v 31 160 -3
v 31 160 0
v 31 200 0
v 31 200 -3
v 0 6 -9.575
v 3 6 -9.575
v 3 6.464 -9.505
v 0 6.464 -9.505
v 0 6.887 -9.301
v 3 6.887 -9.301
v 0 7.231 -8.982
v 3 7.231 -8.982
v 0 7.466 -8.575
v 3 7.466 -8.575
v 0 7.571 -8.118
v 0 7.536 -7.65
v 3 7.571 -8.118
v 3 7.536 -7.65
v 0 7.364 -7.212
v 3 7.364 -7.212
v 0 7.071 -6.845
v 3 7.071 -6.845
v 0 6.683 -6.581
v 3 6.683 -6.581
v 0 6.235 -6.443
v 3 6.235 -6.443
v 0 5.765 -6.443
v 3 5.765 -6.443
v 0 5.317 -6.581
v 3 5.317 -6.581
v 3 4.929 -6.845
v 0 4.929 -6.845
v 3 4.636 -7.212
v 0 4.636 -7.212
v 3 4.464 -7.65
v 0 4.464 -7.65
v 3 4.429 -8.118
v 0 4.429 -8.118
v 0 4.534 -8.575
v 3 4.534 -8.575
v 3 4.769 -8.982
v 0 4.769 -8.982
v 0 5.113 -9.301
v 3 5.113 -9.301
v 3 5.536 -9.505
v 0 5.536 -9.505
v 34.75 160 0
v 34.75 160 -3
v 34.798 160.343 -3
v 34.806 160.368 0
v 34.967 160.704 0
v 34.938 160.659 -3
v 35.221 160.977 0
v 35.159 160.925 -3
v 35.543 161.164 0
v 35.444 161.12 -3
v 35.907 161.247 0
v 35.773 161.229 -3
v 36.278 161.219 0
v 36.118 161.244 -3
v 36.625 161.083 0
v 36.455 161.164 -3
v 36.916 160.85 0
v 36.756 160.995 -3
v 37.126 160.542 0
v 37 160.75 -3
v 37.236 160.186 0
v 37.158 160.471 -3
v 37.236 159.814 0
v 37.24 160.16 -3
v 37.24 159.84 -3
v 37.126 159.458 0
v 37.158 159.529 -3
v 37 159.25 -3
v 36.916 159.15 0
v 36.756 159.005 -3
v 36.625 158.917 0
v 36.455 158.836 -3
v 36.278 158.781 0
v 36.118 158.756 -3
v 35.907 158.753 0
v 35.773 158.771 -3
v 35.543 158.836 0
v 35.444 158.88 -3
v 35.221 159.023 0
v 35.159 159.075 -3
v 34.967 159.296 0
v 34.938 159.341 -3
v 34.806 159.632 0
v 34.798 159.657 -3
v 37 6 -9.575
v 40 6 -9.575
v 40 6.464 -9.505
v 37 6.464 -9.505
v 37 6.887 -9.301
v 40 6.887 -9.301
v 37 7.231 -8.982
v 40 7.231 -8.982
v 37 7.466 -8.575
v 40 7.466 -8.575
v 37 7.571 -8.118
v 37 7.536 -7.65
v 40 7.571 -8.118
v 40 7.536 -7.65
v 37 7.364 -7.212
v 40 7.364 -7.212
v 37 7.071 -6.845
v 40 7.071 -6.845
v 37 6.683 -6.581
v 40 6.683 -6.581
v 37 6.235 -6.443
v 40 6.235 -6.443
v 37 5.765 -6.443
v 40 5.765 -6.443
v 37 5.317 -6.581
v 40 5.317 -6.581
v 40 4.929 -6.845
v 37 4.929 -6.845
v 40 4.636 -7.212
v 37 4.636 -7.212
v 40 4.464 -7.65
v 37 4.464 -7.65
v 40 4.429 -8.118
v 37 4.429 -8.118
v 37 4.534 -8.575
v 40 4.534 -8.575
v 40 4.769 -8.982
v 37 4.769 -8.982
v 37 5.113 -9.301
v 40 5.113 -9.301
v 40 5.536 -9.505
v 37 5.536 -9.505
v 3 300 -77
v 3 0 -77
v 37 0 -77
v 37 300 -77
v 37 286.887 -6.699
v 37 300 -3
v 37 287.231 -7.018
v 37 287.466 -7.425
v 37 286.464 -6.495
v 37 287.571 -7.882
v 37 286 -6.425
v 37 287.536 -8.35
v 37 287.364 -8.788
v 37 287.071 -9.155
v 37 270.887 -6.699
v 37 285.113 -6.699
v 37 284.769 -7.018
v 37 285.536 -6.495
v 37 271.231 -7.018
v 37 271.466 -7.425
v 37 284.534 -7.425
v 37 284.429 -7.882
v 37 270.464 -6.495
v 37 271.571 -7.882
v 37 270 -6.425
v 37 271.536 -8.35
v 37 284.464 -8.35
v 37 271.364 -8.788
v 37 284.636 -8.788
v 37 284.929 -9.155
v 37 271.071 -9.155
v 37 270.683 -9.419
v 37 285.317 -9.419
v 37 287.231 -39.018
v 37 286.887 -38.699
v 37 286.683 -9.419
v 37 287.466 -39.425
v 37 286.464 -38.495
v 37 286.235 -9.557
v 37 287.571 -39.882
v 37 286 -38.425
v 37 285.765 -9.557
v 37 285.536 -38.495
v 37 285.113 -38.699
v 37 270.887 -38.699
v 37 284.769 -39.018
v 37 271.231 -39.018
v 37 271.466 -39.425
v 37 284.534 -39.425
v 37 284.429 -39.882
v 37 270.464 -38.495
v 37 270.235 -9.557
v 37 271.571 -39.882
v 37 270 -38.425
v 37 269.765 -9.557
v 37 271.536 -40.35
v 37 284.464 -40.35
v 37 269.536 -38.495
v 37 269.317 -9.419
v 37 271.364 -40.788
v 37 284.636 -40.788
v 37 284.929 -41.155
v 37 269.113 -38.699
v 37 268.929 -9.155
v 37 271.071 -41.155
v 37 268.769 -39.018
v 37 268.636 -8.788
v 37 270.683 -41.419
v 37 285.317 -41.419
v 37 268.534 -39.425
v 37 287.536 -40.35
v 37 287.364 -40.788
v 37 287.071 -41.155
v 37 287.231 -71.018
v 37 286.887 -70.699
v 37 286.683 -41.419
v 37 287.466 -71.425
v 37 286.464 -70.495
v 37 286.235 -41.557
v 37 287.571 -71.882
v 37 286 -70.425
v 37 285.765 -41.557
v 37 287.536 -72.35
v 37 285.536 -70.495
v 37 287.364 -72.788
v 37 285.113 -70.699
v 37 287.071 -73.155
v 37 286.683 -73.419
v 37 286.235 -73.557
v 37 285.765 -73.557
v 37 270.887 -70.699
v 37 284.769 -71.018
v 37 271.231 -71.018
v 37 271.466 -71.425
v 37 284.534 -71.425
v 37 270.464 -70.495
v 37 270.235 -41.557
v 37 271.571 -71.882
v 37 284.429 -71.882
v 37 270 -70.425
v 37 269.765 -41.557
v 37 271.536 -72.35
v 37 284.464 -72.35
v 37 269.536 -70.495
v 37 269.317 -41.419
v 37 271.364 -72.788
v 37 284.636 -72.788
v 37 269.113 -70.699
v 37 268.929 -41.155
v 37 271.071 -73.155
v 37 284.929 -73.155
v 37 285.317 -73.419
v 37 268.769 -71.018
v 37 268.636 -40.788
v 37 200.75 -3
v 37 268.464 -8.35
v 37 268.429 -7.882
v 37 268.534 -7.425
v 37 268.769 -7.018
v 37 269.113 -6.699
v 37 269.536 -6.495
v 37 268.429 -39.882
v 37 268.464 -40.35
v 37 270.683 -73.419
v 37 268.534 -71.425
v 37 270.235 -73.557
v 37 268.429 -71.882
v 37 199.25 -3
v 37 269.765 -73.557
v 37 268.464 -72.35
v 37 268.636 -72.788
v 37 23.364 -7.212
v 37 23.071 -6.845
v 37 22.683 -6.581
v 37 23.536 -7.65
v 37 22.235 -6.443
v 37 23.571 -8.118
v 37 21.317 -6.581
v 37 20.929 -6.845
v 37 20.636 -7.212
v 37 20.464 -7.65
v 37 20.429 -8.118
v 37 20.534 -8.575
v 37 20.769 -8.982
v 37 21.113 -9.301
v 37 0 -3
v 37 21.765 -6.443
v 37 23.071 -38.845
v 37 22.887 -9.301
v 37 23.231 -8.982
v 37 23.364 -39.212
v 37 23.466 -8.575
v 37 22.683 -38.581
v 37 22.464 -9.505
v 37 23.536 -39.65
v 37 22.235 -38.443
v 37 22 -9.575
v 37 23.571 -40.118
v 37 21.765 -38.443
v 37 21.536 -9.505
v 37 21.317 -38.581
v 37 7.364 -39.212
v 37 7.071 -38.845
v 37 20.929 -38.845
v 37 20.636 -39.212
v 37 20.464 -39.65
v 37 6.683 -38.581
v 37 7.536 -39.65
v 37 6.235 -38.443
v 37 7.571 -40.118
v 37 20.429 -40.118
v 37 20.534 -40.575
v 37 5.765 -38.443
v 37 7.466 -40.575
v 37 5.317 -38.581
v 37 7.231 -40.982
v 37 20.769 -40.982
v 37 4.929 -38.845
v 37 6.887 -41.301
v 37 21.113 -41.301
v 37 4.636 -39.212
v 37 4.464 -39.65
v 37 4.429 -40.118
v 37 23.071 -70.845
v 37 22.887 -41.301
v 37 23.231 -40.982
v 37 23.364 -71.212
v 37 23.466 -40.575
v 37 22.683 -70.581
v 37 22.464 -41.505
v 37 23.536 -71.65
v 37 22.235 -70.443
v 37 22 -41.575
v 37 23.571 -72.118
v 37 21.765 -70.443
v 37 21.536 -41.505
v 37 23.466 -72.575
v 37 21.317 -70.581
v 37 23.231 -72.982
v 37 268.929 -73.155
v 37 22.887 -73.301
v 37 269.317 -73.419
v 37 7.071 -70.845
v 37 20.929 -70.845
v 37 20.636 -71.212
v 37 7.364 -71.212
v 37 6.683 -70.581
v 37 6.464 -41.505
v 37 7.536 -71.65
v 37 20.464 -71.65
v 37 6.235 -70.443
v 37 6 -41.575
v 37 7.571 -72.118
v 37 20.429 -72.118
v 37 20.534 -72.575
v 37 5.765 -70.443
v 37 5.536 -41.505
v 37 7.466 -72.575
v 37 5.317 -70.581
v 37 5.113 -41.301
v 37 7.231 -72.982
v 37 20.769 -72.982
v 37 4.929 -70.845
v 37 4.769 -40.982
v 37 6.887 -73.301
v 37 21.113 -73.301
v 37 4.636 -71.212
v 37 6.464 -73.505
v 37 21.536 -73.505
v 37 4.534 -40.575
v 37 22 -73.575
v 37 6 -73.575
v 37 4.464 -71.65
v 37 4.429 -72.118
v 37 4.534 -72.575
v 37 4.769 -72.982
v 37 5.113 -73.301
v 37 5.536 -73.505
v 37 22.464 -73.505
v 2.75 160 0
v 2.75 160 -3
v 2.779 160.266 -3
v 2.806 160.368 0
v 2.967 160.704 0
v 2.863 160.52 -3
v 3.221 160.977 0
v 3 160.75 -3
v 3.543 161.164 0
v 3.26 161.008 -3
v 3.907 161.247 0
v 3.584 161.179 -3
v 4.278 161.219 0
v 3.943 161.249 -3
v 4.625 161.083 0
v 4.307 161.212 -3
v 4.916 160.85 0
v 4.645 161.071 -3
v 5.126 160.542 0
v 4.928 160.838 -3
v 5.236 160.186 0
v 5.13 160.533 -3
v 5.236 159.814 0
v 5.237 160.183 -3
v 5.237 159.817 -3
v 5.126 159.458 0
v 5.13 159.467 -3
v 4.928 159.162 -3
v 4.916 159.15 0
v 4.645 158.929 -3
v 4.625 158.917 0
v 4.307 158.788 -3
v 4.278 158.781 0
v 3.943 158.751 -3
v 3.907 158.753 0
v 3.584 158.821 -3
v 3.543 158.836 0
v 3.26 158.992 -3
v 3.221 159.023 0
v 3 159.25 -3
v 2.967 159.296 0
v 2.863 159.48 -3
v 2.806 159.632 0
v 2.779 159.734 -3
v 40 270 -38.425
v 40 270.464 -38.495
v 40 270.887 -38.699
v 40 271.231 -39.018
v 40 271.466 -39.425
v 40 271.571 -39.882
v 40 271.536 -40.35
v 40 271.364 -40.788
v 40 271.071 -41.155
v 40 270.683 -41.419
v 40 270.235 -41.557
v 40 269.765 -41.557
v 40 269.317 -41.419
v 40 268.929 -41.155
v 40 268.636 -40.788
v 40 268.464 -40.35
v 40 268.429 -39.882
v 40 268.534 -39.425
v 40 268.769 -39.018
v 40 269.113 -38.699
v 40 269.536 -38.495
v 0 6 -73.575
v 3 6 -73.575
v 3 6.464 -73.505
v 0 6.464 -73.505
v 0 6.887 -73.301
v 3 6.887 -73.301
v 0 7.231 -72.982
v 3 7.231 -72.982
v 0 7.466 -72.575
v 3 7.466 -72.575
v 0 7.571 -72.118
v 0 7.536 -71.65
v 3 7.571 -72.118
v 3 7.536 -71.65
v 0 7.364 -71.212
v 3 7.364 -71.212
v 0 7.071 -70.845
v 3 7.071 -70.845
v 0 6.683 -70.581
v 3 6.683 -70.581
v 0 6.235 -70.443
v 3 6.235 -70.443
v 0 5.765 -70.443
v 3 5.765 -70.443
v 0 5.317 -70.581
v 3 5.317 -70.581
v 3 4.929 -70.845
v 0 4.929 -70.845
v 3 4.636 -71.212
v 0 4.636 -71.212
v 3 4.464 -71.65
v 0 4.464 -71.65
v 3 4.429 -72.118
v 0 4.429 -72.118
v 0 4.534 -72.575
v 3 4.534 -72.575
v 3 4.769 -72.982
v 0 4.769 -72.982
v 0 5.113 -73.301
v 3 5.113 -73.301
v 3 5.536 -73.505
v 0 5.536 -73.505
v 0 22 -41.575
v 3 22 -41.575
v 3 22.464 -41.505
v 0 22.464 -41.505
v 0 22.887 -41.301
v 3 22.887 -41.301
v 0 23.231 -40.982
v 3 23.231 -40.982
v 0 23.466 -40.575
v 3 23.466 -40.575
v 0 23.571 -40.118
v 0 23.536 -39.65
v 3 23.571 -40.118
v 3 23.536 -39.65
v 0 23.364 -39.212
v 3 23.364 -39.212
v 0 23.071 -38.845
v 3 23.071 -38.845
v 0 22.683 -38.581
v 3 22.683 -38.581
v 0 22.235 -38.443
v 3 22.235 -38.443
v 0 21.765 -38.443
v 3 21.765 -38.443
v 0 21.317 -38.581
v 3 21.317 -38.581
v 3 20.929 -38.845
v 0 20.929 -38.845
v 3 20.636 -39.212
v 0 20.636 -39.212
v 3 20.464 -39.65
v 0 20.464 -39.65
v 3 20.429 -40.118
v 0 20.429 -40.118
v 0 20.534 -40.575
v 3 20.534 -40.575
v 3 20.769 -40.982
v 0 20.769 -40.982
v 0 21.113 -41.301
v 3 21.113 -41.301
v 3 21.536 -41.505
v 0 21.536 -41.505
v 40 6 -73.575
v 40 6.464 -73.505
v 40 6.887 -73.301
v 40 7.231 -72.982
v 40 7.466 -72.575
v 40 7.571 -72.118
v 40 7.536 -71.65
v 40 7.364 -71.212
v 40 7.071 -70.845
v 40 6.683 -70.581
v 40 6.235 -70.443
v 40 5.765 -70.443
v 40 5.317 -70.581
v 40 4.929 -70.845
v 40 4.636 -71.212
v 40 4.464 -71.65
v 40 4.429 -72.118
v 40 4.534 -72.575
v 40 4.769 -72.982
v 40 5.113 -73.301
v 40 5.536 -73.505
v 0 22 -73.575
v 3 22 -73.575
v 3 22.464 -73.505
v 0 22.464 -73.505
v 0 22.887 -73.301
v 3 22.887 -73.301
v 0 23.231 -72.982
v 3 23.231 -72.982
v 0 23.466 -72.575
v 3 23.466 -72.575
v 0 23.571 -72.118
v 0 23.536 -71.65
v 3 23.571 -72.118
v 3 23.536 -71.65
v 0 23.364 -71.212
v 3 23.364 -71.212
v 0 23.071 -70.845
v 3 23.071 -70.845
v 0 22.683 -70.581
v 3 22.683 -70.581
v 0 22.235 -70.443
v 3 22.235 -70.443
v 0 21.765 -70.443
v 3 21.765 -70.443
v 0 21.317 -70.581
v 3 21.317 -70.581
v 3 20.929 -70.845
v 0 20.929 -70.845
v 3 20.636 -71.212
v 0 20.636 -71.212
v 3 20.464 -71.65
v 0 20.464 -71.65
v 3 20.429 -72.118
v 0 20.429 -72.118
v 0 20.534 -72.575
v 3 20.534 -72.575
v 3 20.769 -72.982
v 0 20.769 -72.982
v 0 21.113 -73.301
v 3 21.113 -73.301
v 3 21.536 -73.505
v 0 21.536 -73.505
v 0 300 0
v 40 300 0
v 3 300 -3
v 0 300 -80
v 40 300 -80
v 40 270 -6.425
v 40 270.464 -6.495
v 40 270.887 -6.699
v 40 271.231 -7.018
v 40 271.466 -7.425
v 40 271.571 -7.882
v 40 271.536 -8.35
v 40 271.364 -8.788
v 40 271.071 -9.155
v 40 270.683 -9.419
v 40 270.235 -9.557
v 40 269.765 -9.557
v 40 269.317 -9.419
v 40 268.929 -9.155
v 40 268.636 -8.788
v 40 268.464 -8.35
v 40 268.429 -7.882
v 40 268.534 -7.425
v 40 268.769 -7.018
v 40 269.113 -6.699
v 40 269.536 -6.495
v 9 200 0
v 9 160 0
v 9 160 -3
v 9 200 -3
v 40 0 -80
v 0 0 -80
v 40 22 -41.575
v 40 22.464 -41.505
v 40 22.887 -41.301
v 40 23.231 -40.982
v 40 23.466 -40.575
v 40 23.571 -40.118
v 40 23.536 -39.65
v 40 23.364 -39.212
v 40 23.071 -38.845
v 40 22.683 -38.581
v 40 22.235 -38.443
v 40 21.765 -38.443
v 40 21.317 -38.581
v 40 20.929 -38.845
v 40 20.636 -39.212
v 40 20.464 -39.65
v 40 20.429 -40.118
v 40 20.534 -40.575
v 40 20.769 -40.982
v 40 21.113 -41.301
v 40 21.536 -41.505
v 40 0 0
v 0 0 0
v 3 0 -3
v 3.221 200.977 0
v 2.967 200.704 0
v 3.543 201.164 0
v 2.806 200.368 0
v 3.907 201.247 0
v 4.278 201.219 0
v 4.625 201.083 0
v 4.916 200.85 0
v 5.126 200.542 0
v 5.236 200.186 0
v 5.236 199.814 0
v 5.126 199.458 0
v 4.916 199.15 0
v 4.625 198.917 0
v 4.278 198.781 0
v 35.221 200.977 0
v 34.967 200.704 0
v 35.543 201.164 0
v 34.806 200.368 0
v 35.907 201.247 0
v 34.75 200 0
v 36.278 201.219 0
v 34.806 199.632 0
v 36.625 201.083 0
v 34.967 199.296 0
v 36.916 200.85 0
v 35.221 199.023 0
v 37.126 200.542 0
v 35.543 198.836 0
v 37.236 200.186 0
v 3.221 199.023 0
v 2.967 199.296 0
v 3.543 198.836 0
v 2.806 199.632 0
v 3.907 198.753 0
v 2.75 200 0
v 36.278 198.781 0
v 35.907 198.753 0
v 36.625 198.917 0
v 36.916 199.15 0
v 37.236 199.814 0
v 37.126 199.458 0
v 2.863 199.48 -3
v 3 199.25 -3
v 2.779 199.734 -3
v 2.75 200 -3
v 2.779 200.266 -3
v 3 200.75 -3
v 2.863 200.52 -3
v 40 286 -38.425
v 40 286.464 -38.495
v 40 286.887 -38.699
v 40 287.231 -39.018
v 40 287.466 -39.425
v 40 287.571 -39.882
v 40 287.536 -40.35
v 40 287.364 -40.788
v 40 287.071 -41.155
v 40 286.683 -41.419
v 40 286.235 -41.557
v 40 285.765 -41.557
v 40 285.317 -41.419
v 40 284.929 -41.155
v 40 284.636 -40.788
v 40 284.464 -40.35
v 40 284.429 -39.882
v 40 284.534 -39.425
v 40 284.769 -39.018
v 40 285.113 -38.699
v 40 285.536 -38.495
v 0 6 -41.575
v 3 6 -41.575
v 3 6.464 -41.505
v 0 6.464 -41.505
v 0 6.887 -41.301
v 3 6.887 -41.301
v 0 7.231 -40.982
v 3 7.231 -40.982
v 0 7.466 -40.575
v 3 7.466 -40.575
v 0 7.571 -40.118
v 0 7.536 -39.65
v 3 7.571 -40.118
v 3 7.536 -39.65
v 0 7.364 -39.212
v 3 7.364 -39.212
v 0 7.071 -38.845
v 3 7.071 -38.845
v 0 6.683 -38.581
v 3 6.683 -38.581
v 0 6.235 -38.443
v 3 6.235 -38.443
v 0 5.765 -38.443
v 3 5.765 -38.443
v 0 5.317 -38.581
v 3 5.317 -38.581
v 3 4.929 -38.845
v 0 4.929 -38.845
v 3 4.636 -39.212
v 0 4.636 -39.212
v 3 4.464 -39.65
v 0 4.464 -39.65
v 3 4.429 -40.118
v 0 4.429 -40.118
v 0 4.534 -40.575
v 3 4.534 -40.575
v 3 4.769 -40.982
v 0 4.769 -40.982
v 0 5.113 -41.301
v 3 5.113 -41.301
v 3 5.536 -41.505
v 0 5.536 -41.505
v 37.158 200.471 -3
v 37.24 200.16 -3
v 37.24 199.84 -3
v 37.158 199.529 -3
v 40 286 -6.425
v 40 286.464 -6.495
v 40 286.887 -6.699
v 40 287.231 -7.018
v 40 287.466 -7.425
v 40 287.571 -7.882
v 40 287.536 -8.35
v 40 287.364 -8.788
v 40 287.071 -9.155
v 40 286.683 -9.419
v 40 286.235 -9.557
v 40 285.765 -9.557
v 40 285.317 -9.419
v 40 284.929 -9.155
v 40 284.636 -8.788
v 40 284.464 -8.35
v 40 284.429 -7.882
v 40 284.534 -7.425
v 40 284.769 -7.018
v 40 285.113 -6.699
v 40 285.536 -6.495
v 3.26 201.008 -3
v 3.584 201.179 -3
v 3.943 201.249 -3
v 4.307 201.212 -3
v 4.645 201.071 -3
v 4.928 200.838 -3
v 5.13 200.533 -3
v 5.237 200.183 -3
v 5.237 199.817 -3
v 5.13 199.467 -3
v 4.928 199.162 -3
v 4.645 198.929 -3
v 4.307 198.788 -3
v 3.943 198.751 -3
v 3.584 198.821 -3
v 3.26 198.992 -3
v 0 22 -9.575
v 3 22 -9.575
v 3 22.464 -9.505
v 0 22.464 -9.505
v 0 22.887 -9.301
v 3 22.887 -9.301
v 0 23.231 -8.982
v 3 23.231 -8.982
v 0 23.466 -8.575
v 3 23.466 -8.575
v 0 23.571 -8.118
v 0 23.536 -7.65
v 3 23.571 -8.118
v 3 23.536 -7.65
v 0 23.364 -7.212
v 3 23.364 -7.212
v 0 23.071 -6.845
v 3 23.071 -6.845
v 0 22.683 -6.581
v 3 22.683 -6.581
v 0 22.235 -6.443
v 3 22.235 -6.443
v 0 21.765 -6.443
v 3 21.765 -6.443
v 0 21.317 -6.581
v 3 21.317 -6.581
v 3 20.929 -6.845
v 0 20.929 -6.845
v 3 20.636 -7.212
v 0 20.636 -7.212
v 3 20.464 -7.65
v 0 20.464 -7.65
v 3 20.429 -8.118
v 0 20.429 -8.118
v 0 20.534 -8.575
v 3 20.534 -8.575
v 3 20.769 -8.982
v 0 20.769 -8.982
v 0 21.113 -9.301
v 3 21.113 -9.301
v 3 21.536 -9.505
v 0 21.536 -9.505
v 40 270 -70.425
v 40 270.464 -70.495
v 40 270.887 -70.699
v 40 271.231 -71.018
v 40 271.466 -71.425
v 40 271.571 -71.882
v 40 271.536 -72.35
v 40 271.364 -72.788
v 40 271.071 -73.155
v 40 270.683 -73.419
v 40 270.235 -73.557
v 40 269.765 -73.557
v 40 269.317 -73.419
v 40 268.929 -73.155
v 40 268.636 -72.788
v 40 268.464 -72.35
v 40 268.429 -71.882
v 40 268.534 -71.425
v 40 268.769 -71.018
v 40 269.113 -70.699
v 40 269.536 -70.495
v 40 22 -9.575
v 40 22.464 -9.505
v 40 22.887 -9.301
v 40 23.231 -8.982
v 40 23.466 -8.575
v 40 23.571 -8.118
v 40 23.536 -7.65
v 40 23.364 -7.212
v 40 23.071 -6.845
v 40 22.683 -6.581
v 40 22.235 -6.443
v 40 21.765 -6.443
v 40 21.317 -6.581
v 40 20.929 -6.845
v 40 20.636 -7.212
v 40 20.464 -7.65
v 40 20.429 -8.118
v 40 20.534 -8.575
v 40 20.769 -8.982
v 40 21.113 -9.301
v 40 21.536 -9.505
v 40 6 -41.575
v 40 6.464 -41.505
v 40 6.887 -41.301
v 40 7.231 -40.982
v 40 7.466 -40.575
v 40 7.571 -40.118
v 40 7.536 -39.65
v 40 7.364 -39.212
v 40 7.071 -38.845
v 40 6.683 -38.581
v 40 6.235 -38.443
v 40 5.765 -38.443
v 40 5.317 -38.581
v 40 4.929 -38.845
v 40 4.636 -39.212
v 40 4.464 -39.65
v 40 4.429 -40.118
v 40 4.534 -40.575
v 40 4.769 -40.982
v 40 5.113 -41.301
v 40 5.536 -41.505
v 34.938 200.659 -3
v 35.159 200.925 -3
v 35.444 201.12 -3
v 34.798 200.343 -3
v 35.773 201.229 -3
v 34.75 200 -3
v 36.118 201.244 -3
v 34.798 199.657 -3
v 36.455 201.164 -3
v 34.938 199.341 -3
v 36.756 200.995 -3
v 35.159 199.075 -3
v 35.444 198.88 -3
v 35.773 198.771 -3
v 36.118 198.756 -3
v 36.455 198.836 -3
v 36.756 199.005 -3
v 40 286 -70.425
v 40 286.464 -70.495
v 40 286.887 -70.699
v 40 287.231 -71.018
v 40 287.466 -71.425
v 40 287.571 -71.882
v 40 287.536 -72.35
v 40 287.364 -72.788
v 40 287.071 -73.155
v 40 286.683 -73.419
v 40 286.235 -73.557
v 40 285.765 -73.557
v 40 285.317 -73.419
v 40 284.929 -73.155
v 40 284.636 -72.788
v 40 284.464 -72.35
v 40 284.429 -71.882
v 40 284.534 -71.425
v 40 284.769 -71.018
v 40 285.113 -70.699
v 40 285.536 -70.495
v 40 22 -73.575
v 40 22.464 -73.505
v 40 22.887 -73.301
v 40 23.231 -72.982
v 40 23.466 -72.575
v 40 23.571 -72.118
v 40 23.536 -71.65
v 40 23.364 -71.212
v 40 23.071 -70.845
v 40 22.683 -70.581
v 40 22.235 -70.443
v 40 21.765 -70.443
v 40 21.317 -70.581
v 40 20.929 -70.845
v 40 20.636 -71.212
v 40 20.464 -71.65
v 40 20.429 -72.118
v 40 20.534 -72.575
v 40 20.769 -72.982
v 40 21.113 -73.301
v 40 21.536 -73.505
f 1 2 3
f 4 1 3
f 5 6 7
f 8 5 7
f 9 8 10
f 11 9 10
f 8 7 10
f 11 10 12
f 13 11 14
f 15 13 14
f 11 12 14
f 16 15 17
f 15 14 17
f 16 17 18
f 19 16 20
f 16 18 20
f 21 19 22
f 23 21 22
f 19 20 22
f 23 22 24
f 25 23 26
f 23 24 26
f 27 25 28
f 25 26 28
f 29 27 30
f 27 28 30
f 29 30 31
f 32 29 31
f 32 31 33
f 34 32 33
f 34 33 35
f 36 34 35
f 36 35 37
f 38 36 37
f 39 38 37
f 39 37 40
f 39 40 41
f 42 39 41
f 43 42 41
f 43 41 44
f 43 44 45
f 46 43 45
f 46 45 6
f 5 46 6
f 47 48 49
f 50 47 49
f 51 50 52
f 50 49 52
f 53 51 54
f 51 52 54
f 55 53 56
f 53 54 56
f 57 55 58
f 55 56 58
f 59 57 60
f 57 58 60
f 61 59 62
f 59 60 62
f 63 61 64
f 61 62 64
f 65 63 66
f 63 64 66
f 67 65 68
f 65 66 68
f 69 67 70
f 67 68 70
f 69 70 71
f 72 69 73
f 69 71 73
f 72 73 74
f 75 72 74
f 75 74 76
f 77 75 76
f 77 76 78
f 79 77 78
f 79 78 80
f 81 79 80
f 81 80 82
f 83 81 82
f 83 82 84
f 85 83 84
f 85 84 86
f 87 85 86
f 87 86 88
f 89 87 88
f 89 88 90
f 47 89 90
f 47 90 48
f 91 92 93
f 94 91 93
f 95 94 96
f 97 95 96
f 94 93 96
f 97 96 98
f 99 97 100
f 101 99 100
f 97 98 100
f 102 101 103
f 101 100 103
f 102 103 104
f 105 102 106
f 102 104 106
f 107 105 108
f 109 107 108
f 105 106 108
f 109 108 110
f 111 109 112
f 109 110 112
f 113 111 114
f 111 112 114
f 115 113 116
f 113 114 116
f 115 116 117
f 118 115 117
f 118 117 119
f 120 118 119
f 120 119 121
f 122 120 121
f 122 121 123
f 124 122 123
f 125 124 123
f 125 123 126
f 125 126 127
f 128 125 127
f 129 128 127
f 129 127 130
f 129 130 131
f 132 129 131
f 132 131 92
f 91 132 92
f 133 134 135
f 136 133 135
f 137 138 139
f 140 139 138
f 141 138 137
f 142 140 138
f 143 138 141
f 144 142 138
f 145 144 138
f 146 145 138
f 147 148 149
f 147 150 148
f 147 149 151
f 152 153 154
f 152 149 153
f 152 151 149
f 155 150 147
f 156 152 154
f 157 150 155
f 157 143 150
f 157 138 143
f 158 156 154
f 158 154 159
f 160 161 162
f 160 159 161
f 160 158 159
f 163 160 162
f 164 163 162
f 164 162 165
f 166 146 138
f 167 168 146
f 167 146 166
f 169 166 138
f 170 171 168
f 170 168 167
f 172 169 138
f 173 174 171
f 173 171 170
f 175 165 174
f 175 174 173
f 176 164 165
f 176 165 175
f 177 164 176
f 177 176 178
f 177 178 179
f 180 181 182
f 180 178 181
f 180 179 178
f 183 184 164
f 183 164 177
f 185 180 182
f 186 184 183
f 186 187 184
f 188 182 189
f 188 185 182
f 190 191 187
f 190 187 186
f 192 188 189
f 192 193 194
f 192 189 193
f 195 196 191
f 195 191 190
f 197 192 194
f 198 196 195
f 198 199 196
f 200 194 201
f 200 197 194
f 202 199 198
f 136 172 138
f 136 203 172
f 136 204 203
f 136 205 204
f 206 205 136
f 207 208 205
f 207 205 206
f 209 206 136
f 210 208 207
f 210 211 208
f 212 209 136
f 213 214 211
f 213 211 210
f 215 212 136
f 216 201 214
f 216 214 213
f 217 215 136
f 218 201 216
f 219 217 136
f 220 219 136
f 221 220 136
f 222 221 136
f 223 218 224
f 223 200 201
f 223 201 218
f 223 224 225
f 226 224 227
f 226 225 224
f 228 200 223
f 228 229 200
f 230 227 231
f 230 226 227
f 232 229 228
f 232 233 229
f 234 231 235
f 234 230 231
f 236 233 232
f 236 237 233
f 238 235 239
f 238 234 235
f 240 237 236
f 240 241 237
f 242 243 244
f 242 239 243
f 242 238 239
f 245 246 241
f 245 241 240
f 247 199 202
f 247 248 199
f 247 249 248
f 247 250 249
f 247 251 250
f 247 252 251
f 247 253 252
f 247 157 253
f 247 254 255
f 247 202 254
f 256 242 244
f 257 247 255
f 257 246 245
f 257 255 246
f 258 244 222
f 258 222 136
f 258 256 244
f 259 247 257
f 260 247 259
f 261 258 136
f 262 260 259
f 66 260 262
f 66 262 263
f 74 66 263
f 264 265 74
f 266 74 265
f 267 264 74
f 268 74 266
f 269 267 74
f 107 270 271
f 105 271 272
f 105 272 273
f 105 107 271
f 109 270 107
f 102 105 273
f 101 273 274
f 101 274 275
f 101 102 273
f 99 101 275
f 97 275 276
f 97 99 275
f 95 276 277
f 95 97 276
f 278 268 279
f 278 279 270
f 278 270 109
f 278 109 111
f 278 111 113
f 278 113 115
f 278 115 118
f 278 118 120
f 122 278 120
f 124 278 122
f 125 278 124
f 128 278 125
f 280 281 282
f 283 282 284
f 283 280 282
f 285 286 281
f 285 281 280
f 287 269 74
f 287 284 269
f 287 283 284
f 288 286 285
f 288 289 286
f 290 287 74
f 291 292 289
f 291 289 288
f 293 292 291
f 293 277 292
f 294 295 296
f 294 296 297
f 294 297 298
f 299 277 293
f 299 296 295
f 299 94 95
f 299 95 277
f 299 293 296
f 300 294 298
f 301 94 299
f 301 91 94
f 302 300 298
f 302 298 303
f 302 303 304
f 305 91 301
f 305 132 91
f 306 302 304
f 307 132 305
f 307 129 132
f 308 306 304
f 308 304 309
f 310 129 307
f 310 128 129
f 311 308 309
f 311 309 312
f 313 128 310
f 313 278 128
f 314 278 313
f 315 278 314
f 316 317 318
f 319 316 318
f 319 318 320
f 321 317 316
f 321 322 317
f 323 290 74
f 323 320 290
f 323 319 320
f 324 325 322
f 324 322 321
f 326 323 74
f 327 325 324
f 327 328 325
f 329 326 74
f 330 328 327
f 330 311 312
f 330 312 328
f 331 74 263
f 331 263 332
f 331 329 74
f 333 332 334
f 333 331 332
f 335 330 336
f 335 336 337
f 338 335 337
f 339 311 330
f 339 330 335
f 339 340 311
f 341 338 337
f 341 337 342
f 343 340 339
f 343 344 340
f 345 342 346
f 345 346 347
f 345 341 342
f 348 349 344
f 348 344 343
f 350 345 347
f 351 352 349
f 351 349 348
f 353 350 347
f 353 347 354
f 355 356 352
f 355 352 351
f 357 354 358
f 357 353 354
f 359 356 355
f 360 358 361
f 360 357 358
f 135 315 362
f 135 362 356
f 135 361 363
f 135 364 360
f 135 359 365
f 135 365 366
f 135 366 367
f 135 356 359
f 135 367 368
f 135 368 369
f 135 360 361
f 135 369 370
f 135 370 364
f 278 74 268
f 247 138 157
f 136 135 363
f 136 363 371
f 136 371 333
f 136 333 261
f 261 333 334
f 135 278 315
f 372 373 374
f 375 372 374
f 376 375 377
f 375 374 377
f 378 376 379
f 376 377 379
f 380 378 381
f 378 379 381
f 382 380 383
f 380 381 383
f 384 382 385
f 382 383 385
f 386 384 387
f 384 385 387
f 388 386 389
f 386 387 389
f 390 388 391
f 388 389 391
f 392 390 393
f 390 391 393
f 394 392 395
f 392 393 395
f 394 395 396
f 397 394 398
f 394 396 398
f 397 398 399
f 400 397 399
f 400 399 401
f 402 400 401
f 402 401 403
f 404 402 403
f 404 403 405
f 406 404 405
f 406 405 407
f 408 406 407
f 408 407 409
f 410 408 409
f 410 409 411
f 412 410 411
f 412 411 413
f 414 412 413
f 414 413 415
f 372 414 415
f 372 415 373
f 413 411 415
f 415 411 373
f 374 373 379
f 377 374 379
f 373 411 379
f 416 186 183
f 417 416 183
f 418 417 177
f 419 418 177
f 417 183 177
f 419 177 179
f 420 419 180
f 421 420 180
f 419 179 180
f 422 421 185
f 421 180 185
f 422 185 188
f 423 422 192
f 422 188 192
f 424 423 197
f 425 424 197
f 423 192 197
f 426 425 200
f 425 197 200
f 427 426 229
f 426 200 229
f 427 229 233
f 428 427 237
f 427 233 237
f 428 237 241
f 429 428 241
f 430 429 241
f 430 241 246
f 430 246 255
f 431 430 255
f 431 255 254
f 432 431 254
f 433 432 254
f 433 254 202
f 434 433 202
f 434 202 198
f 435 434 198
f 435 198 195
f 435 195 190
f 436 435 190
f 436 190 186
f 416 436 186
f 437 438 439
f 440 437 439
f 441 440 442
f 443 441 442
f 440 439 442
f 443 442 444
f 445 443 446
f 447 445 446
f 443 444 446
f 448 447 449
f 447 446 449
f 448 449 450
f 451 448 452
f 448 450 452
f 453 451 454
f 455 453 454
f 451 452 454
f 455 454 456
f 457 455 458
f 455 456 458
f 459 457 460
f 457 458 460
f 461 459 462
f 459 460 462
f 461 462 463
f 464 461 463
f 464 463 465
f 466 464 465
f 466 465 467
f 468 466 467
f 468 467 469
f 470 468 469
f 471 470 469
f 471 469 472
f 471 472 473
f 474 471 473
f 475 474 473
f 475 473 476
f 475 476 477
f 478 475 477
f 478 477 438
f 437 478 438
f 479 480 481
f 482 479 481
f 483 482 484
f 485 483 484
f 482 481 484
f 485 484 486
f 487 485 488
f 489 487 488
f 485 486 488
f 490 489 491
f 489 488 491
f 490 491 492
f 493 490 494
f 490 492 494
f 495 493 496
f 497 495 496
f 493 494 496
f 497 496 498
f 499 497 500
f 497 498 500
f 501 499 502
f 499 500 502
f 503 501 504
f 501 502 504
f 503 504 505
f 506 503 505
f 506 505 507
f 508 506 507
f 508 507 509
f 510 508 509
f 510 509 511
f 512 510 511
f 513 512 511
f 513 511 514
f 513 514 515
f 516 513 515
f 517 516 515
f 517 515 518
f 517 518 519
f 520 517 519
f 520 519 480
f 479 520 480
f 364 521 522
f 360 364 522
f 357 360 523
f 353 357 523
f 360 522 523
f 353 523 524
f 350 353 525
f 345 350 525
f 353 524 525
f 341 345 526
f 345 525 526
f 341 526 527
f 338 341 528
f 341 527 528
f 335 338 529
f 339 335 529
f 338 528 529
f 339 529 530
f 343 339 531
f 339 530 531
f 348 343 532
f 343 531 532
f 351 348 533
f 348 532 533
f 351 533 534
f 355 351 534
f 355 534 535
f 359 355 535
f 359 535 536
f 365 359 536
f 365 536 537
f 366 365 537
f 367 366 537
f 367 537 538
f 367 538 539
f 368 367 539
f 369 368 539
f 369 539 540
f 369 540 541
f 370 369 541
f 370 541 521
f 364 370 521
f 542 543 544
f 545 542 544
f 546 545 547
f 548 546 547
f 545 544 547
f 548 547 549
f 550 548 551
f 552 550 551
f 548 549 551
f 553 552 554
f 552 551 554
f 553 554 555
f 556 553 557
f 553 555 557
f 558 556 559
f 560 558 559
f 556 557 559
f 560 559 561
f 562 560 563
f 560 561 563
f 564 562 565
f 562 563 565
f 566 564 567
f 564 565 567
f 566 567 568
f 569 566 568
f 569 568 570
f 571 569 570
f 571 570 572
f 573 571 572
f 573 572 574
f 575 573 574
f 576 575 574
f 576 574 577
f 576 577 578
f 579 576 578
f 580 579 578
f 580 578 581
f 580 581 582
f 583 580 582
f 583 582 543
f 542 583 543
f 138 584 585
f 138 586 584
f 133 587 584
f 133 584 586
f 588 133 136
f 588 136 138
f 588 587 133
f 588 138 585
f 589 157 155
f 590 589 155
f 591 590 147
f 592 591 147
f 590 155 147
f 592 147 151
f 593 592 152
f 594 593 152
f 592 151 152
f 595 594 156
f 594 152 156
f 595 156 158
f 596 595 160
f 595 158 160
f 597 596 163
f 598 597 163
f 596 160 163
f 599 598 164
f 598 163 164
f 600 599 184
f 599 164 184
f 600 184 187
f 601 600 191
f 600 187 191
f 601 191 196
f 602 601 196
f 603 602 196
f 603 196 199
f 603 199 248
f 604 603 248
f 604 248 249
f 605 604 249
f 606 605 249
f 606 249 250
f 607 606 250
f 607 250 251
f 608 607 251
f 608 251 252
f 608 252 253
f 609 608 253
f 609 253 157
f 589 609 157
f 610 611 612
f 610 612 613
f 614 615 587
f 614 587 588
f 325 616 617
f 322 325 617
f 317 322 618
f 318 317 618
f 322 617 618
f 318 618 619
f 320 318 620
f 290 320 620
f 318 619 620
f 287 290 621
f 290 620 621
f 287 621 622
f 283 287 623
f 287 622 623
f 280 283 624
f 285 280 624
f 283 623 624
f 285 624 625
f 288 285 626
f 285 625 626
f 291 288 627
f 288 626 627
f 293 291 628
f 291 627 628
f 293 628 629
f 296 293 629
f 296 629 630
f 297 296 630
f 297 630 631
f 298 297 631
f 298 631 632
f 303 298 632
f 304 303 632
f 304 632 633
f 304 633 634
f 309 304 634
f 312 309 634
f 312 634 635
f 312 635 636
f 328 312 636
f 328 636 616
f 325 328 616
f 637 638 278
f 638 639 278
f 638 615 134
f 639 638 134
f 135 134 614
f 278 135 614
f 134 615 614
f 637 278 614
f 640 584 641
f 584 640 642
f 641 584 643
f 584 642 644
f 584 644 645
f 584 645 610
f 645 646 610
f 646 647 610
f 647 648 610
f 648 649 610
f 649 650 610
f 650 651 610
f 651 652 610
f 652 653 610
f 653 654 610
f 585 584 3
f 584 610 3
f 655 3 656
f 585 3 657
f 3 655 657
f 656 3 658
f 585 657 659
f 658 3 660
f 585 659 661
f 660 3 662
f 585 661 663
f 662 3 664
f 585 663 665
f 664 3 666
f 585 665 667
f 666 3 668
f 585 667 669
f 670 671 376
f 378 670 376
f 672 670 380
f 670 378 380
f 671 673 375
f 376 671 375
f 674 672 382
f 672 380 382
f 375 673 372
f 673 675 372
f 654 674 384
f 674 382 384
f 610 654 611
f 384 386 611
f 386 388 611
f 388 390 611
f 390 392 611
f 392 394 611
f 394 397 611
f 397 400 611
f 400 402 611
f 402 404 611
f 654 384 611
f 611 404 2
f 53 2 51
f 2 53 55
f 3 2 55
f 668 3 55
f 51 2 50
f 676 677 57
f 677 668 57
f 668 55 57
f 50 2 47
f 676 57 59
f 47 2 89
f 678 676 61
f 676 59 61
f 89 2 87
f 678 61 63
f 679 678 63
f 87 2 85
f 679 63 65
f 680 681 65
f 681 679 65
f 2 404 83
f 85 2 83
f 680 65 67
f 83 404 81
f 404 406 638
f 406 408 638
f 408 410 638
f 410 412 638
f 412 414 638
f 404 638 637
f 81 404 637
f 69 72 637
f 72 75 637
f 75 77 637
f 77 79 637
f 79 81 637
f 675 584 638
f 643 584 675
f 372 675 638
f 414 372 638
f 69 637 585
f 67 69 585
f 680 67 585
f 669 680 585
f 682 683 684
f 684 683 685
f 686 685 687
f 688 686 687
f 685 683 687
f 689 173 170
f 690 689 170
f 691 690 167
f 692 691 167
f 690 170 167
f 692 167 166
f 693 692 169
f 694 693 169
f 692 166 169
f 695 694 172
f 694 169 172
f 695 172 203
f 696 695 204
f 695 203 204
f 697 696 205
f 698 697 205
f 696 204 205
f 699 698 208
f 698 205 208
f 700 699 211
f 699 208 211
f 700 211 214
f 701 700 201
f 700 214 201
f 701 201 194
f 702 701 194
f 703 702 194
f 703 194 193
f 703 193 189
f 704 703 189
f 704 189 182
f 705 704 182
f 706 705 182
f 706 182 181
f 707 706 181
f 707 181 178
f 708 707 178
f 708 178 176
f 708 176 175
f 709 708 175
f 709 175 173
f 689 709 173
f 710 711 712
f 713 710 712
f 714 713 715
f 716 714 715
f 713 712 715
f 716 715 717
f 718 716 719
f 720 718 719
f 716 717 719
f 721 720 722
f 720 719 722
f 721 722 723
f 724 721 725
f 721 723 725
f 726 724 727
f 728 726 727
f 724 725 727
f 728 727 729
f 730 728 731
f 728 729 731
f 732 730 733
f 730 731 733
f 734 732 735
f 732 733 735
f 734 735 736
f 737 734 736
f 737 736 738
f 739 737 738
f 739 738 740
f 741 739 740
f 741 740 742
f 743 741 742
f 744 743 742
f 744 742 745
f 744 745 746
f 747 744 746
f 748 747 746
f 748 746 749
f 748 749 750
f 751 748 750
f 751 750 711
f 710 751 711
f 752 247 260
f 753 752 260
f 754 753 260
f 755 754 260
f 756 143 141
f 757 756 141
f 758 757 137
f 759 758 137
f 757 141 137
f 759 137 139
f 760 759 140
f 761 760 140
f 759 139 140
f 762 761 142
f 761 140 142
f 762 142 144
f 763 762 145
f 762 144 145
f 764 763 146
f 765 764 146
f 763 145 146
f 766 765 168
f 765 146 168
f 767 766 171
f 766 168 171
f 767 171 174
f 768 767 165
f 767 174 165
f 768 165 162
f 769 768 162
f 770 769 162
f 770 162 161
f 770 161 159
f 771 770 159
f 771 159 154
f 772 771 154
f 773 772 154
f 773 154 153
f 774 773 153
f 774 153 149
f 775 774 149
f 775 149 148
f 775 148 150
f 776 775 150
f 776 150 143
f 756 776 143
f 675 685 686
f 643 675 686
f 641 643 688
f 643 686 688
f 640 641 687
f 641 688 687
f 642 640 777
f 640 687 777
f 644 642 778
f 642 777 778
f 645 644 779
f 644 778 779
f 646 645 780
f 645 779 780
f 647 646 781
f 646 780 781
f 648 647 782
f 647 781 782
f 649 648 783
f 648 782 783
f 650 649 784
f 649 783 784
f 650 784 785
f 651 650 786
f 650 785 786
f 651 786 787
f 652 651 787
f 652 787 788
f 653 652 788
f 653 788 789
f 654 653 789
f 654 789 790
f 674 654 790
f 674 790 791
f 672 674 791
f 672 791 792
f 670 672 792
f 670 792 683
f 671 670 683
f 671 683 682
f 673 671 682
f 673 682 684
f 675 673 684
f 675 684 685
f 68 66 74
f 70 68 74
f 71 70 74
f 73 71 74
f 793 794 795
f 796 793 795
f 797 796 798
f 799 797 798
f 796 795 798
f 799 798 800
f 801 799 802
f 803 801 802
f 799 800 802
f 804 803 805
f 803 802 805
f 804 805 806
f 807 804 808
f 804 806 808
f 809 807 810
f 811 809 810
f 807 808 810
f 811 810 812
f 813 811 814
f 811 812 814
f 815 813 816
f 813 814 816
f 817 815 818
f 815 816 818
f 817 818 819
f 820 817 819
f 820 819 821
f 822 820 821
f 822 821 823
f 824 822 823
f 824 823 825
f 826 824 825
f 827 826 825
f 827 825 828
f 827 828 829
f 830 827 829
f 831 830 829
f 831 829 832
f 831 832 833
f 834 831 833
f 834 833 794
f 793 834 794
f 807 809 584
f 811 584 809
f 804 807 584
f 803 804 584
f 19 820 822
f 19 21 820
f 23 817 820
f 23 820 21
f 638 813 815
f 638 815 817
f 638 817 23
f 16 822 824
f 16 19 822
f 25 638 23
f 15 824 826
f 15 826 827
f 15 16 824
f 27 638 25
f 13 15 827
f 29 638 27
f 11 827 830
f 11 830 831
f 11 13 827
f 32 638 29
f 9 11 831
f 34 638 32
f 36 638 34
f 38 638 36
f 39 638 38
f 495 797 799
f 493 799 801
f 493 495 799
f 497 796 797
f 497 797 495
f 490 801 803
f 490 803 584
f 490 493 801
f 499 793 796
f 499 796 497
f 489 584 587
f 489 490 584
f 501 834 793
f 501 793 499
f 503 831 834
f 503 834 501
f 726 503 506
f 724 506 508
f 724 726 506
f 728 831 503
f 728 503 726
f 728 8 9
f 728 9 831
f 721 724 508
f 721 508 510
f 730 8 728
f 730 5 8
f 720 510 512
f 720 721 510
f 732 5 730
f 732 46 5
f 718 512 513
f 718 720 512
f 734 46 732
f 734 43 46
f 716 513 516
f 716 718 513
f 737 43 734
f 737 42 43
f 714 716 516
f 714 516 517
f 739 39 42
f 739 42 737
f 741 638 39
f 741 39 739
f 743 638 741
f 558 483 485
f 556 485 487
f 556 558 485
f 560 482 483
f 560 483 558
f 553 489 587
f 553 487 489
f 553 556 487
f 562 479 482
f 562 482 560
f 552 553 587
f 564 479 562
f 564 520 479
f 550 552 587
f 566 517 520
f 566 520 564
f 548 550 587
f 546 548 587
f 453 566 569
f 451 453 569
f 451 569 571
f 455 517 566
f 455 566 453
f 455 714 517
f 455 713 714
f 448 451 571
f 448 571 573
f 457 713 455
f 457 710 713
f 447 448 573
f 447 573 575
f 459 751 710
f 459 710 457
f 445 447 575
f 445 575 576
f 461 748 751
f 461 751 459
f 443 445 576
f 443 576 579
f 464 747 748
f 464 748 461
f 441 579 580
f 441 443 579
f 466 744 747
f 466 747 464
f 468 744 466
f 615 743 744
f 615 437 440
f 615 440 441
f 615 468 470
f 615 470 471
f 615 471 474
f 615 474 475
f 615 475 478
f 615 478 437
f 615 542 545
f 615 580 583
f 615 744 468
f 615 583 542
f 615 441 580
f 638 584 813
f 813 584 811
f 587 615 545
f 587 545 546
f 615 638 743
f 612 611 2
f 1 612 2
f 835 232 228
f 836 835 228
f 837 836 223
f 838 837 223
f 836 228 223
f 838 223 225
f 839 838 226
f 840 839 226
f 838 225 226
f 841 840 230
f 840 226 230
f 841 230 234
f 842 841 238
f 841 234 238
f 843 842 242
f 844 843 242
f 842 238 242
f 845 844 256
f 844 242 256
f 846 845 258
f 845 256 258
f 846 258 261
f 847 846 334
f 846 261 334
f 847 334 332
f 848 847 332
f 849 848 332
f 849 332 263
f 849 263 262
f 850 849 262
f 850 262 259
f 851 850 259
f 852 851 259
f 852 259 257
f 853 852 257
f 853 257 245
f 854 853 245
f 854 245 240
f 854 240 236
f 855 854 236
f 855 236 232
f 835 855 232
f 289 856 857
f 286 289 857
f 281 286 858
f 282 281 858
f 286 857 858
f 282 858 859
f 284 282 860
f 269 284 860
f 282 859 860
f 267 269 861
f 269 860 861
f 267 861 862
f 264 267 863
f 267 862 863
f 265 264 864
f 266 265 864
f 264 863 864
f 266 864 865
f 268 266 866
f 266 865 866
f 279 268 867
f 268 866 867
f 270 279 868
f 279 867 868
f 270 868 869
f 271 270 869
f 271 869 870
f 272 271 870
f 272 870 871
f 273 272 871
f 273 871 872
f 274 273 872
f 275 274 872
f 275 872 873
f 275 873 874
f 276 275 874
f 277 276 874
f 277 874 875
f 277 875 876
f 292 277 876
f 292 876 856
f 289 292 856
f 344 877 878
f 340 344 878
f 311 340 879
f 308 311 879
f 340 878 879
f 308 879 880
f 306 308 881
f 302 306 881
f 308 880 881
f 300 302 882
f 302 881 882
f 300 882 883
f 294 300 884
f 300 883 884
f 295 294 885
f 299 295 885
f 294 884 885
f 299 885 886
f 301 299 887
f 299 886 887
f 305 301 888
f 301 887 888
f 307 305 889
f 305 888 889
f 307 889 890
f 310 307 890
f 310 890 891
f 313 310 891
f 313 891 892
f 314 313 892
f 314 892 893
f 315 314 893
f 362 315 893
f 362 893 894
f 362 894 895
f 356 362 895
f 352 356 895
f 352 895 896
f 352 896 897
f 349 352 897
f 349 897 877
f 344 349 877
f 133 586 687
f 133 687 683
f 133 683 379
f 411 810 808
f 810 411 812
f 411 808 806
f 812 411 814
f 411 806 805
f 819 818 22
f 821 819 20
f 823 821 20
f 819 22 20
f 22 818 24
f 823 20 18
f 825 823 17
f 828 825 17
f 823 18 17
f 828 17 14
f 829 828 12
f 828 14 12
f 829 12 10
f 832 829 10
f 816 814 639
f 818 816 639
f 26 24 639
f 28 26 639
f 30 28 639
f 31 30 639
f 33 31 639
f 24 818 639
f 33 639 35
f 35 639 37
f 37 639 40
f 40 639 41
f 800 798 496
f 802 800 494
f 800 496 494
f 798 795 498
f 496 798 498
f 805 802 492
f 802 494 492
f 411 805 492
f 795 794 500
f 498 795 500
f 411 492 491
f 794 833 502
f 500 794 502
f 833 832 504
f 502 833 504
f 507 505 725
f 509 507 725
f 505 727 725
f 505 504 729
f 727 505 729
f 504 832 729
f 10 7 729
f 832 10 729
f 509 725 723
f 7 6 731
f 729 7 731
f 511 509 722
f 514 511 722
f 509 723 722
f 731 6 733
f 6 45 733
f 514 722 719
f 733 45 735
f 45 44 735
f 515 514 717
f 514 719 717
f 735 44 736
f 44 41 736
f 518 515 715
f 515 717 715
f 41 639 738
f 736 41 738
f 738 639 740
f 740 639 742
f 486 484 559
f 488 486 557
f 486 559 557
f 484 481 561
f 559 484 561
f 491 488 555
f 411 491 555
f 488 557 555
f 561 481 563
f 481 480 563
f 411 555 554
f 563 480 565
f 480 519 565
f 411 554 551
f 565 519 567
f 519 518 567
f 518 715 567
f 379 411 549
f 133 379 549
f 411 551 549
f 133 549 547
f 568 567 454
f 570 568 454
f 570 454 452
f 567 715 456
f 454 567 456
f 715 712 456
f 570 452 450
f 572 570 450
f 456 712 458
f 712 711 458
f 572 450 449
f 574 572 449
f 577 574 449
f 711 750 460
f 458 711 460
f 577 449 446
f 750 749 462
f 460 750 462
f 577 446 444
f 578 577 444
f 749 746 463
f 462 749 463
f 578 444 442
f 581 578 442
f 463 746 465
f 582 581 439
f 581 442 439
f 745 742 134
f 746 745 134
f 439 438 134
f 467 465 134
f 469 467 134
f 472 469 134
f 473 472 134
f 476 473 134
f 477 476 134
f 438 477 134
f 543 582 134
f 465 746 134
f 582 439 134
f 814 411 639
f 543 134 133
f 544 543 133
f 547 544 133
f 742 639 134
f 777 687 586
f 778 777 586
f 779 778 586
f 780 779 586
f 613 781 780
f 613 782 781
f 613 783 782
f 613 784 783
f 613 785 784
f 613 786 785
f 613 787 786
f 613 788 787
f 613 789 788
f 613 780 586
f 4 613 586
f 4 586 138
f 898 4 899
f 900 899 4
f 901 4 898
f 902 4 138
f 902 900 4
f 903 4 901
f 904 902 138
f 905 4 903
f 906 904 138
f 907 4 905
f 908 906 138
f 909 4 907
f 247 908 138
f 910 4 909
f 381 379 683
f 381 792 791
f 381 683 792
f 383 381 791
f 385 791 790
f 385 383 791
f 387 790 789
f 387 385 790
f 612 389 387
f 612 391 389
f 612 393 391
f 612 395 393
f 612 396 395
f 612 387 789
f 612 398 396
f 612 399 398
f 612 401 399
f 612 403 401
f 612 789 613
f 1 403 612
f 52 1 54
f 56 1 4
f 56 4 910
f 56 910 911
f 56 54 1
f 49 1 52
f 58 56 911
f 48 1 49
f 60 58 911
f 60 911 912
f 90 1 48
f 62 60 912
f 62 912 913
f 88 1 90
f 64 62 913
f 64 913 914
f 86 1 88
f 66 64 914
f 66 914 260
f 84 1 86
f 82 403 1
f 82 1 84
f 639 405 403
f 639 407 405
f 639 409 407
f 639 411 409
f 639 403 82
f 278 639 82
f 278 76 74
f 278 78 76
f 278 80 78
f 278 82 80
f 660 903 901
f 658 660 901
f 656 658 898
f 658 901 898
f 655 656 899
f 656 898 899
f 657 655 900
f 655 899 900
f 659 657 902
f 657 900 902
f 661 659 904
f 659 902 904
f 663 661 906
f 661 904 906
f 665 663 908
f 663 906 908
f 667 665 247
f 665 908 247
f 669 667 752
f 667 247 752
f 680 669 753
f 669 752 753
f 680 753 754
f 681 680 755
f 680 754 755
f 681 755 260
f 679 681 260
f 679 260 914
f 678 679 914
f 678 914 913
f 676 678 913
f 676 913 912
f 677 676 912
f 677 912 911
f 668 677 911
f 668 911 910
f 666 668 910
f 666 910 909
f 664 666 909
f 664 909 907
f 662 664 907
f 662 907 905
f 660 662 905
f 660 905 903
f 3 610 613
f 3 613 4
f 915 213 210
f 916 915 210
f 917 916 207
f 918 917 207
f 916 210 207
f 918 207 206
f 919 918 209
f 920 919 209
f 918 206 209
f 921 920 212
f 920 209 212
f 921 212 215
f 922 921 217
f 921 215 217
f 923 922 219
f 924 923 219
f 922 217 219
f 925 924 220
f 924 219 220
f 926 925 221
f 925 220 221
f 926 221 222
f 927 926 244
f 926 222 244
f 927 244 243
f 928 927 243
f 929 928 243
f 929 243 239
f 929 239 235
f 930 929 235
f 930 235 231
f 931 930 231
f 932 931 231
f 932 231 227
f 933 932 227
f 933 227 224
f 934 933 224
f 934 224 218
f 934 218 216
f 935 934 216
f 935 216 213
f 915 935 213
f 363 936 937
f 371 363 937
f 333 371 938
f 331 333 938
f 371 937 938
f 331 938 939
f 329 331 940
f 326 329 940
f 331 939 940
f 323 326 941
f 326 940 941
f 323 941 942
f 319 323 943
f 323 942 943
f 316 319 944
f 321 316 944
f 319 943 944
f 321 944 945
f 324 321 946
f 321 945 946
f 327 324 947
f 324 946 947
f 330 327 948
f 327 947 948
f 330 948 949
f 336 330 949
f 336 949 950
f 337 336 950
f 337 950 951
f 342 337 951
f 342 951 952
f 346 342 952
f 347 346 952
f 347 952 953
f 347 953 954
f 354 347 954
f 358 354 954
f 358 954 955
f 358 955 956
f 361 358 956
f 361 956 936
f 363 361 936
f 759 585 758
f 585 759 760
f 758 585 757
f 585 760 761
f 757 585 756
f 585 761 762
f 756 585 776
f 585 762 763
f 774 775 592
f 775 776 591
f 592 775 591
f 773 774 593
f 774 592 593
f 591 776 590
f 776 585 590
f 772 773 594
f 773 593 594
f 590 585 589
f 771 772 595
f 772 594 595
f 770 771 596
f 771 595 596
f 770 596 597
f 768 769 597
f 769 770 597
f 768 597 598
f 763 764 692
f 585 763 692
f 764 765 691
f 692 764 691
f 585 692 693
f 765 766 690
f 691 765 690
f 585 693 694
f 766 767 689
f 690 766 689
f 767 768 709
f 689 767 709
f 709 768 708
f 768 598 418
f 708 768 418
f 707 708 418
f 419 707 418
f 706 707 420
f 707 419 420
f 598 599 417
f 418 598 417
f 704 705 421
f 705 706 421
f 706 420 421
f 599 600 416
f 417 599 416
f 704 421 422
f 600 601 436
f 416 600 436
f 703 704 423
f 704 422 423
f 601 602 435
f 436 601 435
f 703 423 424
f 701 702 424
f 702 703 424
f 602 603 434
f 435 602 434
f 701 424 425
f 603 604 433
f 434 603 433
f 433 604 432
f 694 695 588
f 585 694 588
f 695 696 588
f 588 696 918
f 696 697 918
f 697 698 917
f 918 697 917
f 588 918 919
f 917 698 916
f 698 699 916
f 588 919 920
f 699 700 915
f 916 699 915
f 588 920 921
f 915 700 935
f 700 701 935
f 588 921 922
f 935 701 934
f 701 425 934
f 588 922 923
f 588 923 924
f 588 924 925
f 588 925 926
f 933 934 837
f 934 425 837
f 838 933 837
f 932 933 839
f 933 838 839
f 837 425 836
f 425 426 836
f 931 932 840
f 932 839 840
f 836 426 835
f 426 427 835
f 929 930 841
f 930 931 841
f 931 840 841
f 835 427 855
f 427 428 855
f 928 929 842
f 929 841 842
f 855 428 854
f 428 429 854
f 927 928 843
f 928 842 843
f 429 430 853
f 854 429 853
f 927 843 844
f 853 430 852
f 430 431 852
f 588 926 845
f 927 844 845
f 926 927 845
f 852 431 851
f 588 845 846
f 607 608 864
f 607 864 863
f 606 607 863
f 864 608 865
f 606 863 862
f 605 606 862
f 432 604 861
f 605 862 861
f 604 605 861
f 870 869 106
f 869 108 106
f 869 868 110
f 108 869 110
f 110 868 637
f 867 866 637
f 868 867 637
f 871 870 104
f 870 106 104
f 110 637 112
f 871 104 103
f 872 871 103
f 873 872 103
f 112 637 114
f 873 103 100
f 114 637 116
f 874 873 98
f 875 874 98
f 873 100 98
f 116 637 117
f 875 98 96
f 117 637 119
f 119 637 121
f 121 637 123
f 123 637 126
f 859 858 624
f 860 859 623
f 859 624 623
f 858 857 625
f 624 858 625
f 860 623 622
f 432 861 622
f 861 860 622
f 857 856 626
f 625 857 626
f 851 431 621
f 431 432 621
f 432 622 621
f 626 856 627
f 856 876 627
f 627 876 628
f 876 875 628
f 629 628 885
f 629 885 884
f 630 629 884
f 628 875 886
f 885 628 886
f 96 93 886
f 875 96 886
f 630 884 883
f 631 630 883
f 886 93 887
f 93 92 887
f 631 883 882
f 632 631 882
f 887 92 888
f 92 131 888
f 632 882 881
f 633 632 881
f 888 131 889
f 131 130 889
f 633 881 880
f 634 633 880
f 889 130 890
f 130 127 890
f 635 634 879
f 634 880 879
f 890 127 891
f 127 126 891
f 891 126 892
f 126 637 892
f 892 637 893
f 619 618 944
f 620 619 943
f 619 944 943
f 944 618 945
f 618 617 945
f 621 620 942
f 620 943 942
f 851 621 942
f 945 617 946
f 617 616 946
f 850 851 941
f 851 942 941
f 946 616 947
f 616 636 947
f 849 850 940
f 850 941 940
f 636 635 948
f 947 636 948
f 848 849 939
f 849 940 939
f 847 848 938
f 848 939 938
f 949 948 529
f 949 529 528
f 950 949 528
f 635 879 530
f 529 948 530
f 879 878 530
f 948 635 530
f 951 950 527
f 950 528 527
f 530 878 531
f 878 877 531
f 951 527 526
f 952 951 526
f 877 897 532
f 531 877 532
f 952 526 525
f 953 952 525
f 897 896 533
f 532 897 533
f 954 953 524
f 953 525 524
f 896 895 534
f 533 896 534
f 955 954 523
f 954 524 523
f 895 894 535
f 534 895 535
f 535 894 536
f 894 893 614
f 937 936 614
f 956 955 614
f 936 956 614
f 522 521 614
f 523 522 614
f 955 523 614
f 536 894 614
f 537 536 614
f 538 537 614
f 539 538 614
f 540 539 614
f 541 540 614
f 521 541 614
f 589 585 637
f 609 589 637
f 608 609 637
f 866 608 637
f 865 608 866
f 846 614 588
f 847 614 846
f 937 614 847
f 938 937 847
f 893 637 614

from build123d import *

# Parameters (mm, degrees)
SKETCH1_W                        = 40
SKETCH1_H                        = 80
SKETCH1_W_2                      = 34
SKETCH1_H_2                      = 74
BOSS_EXTRUDE1_DEPTH              = 300
CUT_EXTRUDE1_REACH               = 315.05
SKETCH2_W                        = 22
SKETCH2_H                        = 40
TAP_DRILL_FOR_M3_TAP1_D          = 2.5
TAP_DRILL_FOR_M3_TAP1_DEPTH      = 3
TAP_DRILL_FOR_M3_HELICOIL1_D     = 3.15
TAP_DRILL_FOR_M3_HELICOIL2_D     = 3.15
TAP_DRILL_FOR_M3_HELICOIL2_DEPTH = 3


with BuildPart() as part:
    # Sketch1 → Boss-Extrude1 (new body)
    with BuildSketch(Plane(origin=(0, 0, 0), x_dir=(1, 0, 0), z_dir=(0, 1, 0))):
        with Locations((20, 40)):
            Rectangle(SKETCH1_W, SKETCH1_H)
        with Locations((20, 40)):
            Rectangle(SKETCH1_W_2, SKETCH1_H_2, mode=Mode.SUBTRACT)
    extrude(amount=BOSS_EXTRUDE1_DEPTH)

    # Sketch2 → Cut-Extrude1 (cut, up to next)
    with BuildSketch(Plane.XY, mode=Mode.PRIVATE) as cut_extrude1_sk1:
        with Locations((20, 180)):
            Rectangle(SKETCH2_W, SKETCH2_H)
    cut_extrude1_tool1 = extrude(cut_extrude1_sk1.sketch, amount=-CUT_EXTRUDE1_REACH, mode=Mode.PRIVATE) & part.part
    add(cut_extrude1_tool1.solids().sort_by_distance((20, 180, 0))[0], mode=Mode.SUBTRACT)

    # Tap Drill for M3 Tap1
    with Locations(Plane.XY):
        with Locations((4, 200), (36, 200), (36, 160), (4, 160)):
            Hole(TAP_DRILL_FOR_M3_TAP1_D / 2, depth=TAP_DRILL_FOR_M3_TAP1_DEPTH)

    # Tap Drill for M3 Helicoil1 (through all)
    with Locations(Plane.ZY):
        with Locations((-8, 6), (-40, 6), (-72, 6), (-40, 22), (-72, 22), (-8, 22)):
            Hole(TAP_DRILL_FOR_M3_HELICOIL1_D / 2)

    # Tap Drill for M3 Helicoil2
    with Locations(Plane(origin=(40, 0, 0), x_dir=(0, 0, -1), z_dir=(1, 0, 0))):
        with Locations((72, 286), (72, 270), (40, 286), (40, 270), (8, 286), (8, 270)):
            Hole(TAP_DRILL_FOR_M3_HELICOIL2_D / 2, depth=TAP_DRILL_FOR_M3_HELICOIL2_DEPTH)


solid = part.part
